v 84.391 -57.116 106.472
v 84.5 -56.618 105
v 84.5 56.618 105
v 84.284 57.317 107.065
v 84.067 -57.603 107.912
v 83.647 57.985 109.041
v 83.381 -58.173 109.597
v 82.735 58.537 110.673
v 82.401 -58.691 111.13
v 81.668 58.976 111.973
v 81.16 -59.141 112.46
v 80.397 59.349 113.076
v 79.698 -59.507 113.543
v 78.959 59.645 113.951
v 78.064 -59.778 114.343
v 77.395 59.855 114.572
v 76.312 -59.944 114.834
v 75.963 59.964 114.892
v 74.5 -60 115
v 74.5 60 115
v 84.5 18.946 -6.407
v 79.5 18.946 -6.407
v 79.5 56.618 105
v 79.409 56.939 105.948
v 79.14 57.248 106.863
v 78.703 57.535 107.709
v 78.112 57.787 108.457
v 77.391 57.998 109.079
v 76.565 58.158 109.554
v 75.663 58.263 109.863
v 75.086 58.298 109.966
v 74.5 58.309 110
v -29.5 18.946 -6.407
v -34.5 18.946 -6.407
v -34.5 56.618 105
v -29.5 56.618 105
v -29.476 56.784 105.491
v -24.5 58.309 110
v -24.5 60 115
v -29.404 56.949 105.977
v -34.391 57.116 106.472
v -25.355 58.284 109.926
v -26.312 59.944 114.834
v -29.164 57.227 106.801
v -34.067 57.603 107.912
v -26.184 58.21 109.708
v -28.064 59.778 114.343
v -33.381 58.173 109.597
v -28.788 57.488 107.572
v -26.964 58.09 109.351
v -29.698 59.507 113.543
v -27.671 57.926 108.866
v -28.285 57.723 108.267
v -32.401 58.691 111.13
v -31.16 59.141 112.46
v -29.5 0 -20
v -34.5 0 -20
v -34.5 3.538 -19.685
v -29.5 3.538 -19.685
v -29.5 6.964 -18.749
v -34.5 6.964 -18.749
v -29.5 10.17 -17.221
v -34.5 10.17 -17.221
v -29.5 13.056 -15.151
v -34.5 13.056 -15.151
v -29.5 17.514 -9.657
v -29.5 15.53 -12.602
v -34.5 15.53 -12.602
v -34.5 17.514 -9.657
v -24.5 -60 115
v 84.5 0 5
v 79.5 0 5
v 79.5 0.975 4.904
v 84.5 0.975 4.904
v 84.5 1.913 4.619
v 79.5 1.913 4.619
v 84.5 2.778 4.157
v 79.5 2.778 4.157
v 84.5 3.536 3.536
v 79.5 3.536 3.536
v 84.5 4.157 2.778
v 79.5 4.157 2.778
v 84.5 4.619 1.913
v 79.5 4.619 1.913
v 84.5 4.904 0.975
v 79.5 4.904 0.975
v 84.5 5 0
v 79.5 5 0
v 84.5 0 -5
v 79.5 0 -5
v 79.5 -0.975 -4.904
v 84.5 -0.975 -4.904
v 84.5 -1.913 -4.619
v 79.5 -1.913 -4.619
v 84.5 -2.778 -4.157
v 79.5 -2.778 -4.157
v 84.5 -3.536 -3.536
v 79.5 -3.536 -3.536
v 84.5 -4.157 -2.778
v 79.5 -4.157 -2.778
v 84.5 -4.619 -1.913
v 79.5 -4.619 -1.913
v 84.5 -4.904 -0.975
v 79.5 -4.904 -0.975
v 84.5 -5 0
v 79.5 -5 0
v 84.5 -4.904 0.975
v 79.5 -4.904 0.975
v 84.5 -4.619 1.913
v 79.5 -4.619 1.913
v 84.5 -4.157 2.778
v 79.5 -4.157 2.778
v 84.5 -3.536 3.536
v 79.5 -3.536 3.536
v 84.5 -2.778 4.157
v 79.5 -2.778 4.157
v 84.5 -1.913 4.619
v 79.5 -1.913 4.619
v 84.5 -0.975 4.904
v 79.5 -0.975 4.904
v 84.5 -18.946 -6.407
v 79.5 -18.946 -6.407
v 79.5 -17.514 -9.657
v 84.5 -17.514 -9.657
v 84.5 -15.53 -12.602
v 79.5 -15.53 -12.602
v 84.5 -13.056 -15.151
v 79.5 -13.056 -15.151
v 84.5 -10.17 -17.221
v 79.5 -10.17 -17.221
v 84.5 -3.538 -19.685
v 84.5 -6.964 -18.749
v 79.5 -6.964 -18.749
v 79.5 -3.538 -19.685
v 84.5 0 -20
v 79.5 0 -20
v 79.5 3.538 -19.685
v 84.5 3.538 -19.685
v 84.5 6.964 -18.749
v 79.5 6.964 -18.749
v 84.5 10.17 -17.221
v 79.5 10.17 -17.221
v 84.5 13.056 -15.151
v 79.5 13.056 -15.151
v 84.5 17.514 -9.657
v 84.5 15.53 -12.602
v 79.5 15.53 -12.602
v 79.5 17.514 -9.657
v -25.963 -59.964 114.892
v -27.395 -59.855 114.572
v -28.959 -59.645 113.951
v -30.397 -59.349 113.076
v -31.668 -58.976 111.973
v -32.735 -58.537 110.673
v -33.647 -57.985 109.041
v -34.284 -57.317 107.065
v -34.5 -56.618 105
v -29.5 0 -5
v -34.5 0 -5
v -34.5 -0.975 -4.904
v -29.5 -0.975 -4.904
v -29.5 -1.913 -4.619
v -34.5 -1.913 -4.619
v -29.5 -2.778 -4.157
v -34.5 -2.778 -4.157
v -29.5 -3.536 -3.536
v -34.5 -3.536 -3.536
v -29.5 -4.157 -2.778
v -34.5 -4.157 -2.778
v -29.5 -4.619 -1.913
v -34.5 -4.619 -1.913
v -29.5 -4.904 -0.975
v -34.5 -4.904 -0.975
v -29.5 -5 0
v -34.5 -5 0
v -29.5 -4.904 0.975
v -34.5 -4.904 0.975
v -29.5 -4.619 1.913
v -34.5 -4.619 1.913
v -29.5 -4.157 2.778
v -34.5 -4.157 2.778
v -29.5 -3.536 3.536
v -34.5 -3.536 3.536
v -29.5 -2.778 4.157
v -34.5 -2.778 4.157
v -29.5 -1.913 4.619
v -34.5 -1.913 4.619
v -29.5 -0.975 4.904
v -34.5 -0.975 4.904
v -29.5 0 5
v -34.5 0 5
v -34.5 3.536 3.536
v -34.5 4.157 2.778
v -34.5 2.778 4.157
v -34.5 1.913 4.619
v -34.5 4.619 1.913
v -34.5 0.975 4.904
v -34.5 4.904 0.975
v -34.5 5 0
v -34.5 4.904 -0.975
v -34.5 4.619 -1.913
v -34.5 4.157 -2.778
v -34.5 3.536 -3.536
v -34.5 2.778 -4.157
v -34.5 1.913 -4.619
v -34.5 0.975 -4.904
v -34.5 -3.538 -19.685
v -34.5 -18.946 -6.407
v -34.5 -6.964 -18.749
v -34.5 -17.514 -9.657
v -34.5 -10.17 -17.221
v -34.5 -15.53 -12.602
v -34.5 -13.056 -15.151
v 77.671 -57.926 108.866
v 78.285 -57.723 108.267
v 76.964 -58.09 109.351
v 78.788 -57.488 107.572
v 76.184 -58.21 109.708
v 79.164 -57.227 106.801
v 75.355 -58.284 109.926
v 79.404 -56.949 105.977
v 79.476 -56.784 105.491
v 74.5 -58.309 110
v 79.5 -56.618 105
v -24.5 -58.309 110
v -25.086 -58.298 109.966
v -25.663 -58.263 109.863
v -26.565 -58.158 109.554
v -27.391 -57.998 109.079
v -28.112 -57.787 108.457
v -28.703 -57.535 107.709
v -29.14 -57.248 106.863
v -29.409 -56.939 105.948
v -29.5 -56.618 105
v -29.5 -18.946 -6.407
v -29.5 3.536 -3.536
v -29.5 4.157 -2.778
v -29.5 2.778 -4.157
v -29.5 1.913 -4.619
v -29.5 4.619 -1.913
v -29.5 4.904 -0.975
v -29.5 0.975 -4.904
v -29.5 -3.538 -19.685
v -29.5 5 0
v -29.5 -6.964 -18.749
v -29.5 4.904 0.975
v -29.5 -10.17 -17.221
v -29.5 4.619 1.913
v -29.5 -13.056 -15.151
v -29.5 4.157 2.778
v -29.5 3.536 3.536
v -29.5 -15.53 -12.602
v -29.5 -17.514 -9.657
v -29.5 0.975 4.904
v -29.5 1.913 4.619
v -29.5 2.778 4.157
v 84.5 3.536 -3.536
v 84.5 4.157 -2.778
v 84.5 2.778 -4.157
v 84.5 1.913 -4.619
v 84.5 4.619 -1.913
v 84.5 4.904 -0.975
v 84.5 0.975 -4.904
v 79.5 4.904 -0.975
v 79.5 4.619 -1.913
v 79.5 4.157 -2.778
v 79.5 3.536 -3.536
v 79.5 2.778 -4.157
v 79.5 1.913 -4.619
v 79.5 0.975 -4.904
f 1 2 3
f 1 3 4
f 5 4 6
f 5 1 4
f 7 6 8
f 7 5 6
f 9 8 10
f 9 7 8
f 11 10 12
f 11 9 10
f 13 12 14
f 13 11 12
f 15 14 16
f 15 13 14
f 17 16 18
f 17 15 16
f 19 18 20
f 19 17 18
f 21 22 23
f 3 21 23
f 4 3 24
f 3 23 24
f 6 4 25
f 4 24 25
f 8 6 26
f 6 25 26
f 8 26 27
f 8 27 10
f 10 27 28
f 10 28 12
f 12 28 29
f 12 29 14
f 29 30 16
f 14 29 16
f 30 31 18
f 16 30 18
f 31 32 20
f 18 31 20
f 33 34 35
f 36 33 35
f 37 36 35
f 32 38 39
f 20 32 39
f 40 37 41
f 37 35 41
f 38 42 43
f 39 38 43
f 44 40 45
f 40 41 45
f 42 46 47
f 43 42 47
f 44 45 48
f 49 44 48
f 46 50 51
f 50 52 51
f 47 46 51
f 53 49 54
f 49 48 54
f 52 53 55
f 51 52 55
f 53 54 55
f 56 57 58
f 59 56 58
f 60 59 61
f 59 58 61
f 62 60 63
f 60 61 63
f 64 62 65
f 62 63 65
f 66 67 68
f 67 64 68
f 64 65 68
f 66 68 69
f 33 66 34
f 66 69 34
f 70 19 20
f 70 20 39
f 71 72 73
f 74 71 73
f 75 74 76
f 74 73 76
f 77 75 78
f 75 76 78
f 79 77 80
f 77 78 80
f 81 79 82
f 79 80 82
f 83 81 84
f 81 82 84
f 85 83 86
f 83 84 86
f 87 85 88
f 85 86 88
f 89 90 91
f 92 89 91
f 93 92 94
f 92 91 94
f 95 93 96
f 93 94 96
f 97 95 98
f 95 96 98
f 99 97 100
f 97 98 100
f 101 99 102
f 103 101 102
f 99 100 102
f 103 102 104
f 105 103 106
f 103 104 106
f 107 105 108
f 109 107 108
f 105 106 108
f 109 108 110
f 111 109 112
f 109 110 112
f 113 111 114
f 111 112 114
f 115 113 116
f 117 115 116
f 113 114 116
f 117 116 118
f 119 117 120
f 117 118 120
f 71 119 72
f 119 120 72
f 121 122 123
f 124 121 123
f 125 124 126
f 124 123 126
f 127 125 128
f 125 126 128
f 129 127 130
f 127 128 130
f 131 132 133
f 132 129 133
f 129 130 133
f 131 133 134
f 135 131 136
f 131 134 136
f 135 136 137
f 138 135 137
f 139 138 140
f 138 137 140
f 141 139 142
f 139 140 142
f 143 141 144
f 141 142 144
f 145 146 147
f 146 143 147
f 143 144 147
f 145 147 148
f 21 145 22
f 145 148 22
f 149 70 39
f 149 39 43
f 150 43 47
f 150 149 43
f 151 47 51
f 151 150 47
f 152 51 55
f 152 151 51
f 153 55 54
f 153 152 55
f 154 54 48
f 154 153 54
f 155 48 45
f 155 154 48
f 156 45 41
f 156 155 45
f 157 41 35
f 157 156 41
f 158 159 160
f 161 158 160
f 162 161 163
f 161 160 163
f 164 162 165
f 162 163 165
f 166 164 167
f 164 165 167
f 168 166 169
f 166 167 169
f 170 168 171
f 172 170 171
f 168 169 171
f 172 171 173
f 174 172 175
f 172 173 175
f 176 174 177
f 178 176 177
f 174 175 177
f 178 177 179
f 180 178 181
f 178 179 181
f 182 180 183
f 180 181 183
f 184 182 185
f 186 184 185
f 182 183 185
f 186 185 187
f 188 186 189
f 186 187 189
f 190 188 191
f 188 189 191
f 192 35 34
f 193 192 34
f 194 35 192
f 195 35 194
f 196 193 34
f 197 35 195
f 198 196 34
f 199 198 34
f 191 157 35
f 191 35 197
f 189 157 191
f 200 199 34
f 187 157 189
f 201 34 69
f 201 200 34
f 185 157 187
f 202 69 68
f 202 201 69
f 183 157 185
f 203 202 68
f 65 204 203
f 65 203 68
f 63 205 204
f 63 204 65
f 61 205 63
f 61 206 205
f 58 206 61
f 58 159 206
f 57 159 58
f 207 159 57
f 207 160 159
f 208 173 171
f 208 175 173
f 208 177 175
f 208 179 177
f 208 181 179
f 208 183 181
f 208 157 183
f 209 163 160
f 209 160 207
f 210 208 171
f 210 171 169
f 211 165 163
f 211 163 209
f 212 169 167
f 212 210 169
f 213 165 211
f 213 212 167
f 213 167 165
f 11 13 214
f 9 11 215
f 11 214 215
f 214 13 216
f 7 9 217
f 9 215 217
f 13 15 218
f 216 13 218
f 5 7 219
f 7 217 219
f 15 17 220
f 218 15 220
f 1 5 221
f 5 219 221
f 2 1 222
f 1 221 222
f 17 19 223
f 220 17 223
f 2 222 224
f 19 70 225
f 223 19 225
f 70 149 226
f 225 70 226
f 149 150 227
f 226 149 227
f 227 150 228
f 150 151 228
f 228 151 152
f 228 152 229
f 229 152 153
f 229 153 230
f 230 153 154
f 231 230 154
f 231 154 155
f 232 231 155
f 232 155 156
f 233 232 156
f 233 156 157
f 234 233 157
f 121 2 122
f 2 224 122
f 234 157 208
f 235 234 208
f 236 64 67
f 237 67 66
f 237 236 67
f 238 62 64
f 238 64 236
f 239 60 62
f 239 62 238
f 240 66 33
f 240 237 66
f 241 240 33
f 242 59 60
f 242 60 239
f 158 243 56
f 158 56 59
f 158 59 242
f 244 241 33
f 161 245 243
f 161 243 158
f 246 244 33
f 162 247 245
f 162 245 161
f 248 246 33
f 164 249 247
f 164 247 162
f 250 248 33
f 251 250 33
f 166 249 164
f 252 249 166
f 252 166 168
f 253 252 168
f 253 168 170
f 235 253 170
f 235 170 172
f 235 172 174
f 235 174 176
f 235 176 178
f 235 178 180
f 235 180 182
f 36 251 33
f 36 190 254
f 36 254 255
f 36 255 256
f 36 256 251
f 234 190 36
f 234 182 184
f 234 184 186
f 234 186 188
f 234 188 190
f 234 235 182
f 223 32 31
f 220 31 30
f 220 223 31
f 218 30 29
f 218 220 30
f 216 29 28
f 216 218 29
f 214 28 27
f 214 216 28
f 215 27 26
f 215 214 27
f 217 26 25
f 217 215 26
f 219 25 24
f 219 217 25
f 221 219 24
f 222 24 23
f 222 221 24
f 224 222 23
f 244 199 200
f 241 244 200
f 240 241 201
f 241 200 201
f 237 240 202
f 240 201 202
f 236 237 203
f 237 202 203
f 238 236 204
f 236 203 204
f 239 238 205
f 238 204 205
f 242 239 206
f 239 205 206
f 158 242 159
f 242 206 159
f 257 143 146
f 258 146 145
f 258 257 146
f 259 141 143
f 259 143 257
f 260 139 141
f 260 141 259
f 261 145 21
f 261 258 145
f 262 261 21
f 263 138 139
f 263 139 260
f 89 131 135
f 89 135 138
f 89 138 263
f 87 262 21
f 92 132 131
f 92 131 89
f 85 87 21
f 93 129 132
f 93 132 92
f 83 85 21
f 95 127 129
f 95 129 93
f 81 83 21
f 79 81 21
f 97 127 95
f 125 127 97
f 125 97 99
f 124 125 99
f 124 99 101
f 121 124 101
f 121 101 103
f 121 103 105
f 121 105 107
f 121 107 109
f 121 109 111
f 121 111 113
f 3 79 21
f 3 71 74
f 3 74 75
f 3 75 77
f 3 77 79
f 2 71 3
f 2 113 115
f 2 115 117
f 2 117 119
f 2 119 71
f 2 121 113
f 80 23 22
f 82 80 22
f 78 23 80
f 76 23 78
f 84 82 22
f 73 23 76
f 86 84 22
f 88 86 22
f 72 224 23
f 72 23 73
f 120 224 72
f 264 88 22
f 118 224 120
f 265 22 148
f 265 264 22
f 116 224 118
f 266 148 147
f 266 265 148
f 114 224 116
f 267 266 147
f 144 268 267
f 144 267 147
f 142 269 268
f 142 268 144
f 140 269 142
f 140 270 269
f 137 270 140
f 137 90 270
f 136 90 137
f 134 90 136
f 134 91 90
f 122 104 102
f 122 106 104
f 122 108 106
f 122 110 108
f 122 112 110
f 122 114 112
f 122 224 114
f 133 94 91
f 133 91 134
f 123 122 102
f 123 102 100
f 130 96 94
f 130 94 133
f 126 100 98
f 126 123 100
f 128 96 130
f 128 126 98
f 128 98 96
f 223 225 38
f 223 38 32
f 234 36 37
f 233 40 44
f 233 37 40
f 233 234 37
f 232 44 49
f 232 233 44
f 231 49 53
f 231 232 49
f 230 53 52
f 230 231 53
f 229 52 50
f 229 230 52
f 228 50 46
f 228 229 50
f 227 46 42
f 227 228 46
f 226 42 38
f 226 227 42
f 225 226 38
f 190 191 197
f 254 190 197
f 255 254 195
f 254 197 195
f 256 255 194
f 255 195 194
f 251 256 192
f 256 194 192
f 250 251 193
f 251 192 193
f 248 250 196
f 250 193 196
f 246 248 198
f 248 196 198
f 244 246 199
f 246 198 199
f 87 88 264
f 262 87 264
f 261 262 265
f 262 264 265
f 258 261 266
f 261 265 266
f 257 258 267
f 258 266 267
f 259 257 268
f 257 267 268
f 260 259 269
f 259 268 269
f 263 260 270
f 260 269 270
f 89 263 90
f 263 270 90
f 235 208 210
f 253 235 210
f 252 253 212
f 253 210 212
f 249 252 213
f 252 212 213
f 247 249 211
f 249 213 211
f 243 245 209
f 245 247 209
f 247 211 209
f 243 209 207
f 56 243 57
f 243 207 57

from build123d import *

# Parameters (mm, degrees)
F2_DEPTH      = 80
F2_DEPTH_BACK = 80
F3_START      = -34.501
F3_DEPTH      = 119.002


with BuildPart() as f2:
    # F0 (on Front) → F2 (new body, two sides)
    with BuildSketch(Plane.XZ) as f2_sk:
        with BuildLine():
            Line((25, 115), (25, 110))
            Line((25, 110), (74.5, 110))
            ThreePointArc((74.5, 110), (78.0355339059, 108.5355339059), (79.5, 105))
            Line((79.5, 105), (79.5, 0))
            Line((79.5, 0), (79.5, -20))
            Line((79.5, -20), (84.5, -20))
            Line((84.5, -20), (84.5, 105))
            ThreePointArc((84.5, 105), (81.5710678119, 112.0710678119), (74.5, 115))
            Line((74.5, 115), (25, 115))
        make_face()
        with BuildLine():
            Line((-29.5, -20), (-29.5, 0))
            Line((-29.5, 0), (-29.5, 105))
            ThreePointArc((-29.5, 105), (-28.0355339059, 108.5355339059), (-24.5, 110))
            Line((-24.5, 110), (25, 110))
            Line((25, 110), (25, 115))
            Line((25, 115), (-24.5, 115))
            ThreePointArc((-24.5, 115), (-31.5710678119, 112.0710678119), (-34.5, 105))
            Line((-34.5, 105), (-34.5, -20))
            Line((-34.5, -20), (-29.5, -20))
        make_face()
    extrude(amount=F2_DEPTH)
    extrude(f2_sk.sketch, amount=-F2_DEPTH_BACK)

    # F1 (on Right) → F3 (intersect)
    with BuildSketch(Plane.YZ.offset(F3_START)):
        with BuildLine():
            Line((-60, 115), (-18.9460998047, -6.4066607677))
            ThreePointArc((-18.9460998047, -6.4066607677), (-11.6590476594, -16.2501263896), (0, -20))
            Line((0, -20), (0, -5))
            ThreePointArc((0, -5), (-5, 0), (0, 5))
            Line((0, 5), (0, 115))
            Line((0, 115), (-60, 115))
        make_face()
        with BuildLine():
            Line((0, -5), (0, -20))
            ThreePointArc((0, -20), (11.6590476594, -16.2501263896), (18.9460998047, -6.4066607677))
            Line((18.9460998047, -6.4066607677), (60, 115))
            Line((60, 115), (0, 115))
            Line((0, 115), (0, 5))
            ThreePointArc((0, 5), (3.5355339059, 3.5355339059), (5, 0))
            ThreePointArc((5, 0), (3.5355339059, -3.5355339059), (0, -5))
        make_face()
    extrude(amount=F3_DEPTH, mode=Mode.INTERSECT)


solid = f2.part
